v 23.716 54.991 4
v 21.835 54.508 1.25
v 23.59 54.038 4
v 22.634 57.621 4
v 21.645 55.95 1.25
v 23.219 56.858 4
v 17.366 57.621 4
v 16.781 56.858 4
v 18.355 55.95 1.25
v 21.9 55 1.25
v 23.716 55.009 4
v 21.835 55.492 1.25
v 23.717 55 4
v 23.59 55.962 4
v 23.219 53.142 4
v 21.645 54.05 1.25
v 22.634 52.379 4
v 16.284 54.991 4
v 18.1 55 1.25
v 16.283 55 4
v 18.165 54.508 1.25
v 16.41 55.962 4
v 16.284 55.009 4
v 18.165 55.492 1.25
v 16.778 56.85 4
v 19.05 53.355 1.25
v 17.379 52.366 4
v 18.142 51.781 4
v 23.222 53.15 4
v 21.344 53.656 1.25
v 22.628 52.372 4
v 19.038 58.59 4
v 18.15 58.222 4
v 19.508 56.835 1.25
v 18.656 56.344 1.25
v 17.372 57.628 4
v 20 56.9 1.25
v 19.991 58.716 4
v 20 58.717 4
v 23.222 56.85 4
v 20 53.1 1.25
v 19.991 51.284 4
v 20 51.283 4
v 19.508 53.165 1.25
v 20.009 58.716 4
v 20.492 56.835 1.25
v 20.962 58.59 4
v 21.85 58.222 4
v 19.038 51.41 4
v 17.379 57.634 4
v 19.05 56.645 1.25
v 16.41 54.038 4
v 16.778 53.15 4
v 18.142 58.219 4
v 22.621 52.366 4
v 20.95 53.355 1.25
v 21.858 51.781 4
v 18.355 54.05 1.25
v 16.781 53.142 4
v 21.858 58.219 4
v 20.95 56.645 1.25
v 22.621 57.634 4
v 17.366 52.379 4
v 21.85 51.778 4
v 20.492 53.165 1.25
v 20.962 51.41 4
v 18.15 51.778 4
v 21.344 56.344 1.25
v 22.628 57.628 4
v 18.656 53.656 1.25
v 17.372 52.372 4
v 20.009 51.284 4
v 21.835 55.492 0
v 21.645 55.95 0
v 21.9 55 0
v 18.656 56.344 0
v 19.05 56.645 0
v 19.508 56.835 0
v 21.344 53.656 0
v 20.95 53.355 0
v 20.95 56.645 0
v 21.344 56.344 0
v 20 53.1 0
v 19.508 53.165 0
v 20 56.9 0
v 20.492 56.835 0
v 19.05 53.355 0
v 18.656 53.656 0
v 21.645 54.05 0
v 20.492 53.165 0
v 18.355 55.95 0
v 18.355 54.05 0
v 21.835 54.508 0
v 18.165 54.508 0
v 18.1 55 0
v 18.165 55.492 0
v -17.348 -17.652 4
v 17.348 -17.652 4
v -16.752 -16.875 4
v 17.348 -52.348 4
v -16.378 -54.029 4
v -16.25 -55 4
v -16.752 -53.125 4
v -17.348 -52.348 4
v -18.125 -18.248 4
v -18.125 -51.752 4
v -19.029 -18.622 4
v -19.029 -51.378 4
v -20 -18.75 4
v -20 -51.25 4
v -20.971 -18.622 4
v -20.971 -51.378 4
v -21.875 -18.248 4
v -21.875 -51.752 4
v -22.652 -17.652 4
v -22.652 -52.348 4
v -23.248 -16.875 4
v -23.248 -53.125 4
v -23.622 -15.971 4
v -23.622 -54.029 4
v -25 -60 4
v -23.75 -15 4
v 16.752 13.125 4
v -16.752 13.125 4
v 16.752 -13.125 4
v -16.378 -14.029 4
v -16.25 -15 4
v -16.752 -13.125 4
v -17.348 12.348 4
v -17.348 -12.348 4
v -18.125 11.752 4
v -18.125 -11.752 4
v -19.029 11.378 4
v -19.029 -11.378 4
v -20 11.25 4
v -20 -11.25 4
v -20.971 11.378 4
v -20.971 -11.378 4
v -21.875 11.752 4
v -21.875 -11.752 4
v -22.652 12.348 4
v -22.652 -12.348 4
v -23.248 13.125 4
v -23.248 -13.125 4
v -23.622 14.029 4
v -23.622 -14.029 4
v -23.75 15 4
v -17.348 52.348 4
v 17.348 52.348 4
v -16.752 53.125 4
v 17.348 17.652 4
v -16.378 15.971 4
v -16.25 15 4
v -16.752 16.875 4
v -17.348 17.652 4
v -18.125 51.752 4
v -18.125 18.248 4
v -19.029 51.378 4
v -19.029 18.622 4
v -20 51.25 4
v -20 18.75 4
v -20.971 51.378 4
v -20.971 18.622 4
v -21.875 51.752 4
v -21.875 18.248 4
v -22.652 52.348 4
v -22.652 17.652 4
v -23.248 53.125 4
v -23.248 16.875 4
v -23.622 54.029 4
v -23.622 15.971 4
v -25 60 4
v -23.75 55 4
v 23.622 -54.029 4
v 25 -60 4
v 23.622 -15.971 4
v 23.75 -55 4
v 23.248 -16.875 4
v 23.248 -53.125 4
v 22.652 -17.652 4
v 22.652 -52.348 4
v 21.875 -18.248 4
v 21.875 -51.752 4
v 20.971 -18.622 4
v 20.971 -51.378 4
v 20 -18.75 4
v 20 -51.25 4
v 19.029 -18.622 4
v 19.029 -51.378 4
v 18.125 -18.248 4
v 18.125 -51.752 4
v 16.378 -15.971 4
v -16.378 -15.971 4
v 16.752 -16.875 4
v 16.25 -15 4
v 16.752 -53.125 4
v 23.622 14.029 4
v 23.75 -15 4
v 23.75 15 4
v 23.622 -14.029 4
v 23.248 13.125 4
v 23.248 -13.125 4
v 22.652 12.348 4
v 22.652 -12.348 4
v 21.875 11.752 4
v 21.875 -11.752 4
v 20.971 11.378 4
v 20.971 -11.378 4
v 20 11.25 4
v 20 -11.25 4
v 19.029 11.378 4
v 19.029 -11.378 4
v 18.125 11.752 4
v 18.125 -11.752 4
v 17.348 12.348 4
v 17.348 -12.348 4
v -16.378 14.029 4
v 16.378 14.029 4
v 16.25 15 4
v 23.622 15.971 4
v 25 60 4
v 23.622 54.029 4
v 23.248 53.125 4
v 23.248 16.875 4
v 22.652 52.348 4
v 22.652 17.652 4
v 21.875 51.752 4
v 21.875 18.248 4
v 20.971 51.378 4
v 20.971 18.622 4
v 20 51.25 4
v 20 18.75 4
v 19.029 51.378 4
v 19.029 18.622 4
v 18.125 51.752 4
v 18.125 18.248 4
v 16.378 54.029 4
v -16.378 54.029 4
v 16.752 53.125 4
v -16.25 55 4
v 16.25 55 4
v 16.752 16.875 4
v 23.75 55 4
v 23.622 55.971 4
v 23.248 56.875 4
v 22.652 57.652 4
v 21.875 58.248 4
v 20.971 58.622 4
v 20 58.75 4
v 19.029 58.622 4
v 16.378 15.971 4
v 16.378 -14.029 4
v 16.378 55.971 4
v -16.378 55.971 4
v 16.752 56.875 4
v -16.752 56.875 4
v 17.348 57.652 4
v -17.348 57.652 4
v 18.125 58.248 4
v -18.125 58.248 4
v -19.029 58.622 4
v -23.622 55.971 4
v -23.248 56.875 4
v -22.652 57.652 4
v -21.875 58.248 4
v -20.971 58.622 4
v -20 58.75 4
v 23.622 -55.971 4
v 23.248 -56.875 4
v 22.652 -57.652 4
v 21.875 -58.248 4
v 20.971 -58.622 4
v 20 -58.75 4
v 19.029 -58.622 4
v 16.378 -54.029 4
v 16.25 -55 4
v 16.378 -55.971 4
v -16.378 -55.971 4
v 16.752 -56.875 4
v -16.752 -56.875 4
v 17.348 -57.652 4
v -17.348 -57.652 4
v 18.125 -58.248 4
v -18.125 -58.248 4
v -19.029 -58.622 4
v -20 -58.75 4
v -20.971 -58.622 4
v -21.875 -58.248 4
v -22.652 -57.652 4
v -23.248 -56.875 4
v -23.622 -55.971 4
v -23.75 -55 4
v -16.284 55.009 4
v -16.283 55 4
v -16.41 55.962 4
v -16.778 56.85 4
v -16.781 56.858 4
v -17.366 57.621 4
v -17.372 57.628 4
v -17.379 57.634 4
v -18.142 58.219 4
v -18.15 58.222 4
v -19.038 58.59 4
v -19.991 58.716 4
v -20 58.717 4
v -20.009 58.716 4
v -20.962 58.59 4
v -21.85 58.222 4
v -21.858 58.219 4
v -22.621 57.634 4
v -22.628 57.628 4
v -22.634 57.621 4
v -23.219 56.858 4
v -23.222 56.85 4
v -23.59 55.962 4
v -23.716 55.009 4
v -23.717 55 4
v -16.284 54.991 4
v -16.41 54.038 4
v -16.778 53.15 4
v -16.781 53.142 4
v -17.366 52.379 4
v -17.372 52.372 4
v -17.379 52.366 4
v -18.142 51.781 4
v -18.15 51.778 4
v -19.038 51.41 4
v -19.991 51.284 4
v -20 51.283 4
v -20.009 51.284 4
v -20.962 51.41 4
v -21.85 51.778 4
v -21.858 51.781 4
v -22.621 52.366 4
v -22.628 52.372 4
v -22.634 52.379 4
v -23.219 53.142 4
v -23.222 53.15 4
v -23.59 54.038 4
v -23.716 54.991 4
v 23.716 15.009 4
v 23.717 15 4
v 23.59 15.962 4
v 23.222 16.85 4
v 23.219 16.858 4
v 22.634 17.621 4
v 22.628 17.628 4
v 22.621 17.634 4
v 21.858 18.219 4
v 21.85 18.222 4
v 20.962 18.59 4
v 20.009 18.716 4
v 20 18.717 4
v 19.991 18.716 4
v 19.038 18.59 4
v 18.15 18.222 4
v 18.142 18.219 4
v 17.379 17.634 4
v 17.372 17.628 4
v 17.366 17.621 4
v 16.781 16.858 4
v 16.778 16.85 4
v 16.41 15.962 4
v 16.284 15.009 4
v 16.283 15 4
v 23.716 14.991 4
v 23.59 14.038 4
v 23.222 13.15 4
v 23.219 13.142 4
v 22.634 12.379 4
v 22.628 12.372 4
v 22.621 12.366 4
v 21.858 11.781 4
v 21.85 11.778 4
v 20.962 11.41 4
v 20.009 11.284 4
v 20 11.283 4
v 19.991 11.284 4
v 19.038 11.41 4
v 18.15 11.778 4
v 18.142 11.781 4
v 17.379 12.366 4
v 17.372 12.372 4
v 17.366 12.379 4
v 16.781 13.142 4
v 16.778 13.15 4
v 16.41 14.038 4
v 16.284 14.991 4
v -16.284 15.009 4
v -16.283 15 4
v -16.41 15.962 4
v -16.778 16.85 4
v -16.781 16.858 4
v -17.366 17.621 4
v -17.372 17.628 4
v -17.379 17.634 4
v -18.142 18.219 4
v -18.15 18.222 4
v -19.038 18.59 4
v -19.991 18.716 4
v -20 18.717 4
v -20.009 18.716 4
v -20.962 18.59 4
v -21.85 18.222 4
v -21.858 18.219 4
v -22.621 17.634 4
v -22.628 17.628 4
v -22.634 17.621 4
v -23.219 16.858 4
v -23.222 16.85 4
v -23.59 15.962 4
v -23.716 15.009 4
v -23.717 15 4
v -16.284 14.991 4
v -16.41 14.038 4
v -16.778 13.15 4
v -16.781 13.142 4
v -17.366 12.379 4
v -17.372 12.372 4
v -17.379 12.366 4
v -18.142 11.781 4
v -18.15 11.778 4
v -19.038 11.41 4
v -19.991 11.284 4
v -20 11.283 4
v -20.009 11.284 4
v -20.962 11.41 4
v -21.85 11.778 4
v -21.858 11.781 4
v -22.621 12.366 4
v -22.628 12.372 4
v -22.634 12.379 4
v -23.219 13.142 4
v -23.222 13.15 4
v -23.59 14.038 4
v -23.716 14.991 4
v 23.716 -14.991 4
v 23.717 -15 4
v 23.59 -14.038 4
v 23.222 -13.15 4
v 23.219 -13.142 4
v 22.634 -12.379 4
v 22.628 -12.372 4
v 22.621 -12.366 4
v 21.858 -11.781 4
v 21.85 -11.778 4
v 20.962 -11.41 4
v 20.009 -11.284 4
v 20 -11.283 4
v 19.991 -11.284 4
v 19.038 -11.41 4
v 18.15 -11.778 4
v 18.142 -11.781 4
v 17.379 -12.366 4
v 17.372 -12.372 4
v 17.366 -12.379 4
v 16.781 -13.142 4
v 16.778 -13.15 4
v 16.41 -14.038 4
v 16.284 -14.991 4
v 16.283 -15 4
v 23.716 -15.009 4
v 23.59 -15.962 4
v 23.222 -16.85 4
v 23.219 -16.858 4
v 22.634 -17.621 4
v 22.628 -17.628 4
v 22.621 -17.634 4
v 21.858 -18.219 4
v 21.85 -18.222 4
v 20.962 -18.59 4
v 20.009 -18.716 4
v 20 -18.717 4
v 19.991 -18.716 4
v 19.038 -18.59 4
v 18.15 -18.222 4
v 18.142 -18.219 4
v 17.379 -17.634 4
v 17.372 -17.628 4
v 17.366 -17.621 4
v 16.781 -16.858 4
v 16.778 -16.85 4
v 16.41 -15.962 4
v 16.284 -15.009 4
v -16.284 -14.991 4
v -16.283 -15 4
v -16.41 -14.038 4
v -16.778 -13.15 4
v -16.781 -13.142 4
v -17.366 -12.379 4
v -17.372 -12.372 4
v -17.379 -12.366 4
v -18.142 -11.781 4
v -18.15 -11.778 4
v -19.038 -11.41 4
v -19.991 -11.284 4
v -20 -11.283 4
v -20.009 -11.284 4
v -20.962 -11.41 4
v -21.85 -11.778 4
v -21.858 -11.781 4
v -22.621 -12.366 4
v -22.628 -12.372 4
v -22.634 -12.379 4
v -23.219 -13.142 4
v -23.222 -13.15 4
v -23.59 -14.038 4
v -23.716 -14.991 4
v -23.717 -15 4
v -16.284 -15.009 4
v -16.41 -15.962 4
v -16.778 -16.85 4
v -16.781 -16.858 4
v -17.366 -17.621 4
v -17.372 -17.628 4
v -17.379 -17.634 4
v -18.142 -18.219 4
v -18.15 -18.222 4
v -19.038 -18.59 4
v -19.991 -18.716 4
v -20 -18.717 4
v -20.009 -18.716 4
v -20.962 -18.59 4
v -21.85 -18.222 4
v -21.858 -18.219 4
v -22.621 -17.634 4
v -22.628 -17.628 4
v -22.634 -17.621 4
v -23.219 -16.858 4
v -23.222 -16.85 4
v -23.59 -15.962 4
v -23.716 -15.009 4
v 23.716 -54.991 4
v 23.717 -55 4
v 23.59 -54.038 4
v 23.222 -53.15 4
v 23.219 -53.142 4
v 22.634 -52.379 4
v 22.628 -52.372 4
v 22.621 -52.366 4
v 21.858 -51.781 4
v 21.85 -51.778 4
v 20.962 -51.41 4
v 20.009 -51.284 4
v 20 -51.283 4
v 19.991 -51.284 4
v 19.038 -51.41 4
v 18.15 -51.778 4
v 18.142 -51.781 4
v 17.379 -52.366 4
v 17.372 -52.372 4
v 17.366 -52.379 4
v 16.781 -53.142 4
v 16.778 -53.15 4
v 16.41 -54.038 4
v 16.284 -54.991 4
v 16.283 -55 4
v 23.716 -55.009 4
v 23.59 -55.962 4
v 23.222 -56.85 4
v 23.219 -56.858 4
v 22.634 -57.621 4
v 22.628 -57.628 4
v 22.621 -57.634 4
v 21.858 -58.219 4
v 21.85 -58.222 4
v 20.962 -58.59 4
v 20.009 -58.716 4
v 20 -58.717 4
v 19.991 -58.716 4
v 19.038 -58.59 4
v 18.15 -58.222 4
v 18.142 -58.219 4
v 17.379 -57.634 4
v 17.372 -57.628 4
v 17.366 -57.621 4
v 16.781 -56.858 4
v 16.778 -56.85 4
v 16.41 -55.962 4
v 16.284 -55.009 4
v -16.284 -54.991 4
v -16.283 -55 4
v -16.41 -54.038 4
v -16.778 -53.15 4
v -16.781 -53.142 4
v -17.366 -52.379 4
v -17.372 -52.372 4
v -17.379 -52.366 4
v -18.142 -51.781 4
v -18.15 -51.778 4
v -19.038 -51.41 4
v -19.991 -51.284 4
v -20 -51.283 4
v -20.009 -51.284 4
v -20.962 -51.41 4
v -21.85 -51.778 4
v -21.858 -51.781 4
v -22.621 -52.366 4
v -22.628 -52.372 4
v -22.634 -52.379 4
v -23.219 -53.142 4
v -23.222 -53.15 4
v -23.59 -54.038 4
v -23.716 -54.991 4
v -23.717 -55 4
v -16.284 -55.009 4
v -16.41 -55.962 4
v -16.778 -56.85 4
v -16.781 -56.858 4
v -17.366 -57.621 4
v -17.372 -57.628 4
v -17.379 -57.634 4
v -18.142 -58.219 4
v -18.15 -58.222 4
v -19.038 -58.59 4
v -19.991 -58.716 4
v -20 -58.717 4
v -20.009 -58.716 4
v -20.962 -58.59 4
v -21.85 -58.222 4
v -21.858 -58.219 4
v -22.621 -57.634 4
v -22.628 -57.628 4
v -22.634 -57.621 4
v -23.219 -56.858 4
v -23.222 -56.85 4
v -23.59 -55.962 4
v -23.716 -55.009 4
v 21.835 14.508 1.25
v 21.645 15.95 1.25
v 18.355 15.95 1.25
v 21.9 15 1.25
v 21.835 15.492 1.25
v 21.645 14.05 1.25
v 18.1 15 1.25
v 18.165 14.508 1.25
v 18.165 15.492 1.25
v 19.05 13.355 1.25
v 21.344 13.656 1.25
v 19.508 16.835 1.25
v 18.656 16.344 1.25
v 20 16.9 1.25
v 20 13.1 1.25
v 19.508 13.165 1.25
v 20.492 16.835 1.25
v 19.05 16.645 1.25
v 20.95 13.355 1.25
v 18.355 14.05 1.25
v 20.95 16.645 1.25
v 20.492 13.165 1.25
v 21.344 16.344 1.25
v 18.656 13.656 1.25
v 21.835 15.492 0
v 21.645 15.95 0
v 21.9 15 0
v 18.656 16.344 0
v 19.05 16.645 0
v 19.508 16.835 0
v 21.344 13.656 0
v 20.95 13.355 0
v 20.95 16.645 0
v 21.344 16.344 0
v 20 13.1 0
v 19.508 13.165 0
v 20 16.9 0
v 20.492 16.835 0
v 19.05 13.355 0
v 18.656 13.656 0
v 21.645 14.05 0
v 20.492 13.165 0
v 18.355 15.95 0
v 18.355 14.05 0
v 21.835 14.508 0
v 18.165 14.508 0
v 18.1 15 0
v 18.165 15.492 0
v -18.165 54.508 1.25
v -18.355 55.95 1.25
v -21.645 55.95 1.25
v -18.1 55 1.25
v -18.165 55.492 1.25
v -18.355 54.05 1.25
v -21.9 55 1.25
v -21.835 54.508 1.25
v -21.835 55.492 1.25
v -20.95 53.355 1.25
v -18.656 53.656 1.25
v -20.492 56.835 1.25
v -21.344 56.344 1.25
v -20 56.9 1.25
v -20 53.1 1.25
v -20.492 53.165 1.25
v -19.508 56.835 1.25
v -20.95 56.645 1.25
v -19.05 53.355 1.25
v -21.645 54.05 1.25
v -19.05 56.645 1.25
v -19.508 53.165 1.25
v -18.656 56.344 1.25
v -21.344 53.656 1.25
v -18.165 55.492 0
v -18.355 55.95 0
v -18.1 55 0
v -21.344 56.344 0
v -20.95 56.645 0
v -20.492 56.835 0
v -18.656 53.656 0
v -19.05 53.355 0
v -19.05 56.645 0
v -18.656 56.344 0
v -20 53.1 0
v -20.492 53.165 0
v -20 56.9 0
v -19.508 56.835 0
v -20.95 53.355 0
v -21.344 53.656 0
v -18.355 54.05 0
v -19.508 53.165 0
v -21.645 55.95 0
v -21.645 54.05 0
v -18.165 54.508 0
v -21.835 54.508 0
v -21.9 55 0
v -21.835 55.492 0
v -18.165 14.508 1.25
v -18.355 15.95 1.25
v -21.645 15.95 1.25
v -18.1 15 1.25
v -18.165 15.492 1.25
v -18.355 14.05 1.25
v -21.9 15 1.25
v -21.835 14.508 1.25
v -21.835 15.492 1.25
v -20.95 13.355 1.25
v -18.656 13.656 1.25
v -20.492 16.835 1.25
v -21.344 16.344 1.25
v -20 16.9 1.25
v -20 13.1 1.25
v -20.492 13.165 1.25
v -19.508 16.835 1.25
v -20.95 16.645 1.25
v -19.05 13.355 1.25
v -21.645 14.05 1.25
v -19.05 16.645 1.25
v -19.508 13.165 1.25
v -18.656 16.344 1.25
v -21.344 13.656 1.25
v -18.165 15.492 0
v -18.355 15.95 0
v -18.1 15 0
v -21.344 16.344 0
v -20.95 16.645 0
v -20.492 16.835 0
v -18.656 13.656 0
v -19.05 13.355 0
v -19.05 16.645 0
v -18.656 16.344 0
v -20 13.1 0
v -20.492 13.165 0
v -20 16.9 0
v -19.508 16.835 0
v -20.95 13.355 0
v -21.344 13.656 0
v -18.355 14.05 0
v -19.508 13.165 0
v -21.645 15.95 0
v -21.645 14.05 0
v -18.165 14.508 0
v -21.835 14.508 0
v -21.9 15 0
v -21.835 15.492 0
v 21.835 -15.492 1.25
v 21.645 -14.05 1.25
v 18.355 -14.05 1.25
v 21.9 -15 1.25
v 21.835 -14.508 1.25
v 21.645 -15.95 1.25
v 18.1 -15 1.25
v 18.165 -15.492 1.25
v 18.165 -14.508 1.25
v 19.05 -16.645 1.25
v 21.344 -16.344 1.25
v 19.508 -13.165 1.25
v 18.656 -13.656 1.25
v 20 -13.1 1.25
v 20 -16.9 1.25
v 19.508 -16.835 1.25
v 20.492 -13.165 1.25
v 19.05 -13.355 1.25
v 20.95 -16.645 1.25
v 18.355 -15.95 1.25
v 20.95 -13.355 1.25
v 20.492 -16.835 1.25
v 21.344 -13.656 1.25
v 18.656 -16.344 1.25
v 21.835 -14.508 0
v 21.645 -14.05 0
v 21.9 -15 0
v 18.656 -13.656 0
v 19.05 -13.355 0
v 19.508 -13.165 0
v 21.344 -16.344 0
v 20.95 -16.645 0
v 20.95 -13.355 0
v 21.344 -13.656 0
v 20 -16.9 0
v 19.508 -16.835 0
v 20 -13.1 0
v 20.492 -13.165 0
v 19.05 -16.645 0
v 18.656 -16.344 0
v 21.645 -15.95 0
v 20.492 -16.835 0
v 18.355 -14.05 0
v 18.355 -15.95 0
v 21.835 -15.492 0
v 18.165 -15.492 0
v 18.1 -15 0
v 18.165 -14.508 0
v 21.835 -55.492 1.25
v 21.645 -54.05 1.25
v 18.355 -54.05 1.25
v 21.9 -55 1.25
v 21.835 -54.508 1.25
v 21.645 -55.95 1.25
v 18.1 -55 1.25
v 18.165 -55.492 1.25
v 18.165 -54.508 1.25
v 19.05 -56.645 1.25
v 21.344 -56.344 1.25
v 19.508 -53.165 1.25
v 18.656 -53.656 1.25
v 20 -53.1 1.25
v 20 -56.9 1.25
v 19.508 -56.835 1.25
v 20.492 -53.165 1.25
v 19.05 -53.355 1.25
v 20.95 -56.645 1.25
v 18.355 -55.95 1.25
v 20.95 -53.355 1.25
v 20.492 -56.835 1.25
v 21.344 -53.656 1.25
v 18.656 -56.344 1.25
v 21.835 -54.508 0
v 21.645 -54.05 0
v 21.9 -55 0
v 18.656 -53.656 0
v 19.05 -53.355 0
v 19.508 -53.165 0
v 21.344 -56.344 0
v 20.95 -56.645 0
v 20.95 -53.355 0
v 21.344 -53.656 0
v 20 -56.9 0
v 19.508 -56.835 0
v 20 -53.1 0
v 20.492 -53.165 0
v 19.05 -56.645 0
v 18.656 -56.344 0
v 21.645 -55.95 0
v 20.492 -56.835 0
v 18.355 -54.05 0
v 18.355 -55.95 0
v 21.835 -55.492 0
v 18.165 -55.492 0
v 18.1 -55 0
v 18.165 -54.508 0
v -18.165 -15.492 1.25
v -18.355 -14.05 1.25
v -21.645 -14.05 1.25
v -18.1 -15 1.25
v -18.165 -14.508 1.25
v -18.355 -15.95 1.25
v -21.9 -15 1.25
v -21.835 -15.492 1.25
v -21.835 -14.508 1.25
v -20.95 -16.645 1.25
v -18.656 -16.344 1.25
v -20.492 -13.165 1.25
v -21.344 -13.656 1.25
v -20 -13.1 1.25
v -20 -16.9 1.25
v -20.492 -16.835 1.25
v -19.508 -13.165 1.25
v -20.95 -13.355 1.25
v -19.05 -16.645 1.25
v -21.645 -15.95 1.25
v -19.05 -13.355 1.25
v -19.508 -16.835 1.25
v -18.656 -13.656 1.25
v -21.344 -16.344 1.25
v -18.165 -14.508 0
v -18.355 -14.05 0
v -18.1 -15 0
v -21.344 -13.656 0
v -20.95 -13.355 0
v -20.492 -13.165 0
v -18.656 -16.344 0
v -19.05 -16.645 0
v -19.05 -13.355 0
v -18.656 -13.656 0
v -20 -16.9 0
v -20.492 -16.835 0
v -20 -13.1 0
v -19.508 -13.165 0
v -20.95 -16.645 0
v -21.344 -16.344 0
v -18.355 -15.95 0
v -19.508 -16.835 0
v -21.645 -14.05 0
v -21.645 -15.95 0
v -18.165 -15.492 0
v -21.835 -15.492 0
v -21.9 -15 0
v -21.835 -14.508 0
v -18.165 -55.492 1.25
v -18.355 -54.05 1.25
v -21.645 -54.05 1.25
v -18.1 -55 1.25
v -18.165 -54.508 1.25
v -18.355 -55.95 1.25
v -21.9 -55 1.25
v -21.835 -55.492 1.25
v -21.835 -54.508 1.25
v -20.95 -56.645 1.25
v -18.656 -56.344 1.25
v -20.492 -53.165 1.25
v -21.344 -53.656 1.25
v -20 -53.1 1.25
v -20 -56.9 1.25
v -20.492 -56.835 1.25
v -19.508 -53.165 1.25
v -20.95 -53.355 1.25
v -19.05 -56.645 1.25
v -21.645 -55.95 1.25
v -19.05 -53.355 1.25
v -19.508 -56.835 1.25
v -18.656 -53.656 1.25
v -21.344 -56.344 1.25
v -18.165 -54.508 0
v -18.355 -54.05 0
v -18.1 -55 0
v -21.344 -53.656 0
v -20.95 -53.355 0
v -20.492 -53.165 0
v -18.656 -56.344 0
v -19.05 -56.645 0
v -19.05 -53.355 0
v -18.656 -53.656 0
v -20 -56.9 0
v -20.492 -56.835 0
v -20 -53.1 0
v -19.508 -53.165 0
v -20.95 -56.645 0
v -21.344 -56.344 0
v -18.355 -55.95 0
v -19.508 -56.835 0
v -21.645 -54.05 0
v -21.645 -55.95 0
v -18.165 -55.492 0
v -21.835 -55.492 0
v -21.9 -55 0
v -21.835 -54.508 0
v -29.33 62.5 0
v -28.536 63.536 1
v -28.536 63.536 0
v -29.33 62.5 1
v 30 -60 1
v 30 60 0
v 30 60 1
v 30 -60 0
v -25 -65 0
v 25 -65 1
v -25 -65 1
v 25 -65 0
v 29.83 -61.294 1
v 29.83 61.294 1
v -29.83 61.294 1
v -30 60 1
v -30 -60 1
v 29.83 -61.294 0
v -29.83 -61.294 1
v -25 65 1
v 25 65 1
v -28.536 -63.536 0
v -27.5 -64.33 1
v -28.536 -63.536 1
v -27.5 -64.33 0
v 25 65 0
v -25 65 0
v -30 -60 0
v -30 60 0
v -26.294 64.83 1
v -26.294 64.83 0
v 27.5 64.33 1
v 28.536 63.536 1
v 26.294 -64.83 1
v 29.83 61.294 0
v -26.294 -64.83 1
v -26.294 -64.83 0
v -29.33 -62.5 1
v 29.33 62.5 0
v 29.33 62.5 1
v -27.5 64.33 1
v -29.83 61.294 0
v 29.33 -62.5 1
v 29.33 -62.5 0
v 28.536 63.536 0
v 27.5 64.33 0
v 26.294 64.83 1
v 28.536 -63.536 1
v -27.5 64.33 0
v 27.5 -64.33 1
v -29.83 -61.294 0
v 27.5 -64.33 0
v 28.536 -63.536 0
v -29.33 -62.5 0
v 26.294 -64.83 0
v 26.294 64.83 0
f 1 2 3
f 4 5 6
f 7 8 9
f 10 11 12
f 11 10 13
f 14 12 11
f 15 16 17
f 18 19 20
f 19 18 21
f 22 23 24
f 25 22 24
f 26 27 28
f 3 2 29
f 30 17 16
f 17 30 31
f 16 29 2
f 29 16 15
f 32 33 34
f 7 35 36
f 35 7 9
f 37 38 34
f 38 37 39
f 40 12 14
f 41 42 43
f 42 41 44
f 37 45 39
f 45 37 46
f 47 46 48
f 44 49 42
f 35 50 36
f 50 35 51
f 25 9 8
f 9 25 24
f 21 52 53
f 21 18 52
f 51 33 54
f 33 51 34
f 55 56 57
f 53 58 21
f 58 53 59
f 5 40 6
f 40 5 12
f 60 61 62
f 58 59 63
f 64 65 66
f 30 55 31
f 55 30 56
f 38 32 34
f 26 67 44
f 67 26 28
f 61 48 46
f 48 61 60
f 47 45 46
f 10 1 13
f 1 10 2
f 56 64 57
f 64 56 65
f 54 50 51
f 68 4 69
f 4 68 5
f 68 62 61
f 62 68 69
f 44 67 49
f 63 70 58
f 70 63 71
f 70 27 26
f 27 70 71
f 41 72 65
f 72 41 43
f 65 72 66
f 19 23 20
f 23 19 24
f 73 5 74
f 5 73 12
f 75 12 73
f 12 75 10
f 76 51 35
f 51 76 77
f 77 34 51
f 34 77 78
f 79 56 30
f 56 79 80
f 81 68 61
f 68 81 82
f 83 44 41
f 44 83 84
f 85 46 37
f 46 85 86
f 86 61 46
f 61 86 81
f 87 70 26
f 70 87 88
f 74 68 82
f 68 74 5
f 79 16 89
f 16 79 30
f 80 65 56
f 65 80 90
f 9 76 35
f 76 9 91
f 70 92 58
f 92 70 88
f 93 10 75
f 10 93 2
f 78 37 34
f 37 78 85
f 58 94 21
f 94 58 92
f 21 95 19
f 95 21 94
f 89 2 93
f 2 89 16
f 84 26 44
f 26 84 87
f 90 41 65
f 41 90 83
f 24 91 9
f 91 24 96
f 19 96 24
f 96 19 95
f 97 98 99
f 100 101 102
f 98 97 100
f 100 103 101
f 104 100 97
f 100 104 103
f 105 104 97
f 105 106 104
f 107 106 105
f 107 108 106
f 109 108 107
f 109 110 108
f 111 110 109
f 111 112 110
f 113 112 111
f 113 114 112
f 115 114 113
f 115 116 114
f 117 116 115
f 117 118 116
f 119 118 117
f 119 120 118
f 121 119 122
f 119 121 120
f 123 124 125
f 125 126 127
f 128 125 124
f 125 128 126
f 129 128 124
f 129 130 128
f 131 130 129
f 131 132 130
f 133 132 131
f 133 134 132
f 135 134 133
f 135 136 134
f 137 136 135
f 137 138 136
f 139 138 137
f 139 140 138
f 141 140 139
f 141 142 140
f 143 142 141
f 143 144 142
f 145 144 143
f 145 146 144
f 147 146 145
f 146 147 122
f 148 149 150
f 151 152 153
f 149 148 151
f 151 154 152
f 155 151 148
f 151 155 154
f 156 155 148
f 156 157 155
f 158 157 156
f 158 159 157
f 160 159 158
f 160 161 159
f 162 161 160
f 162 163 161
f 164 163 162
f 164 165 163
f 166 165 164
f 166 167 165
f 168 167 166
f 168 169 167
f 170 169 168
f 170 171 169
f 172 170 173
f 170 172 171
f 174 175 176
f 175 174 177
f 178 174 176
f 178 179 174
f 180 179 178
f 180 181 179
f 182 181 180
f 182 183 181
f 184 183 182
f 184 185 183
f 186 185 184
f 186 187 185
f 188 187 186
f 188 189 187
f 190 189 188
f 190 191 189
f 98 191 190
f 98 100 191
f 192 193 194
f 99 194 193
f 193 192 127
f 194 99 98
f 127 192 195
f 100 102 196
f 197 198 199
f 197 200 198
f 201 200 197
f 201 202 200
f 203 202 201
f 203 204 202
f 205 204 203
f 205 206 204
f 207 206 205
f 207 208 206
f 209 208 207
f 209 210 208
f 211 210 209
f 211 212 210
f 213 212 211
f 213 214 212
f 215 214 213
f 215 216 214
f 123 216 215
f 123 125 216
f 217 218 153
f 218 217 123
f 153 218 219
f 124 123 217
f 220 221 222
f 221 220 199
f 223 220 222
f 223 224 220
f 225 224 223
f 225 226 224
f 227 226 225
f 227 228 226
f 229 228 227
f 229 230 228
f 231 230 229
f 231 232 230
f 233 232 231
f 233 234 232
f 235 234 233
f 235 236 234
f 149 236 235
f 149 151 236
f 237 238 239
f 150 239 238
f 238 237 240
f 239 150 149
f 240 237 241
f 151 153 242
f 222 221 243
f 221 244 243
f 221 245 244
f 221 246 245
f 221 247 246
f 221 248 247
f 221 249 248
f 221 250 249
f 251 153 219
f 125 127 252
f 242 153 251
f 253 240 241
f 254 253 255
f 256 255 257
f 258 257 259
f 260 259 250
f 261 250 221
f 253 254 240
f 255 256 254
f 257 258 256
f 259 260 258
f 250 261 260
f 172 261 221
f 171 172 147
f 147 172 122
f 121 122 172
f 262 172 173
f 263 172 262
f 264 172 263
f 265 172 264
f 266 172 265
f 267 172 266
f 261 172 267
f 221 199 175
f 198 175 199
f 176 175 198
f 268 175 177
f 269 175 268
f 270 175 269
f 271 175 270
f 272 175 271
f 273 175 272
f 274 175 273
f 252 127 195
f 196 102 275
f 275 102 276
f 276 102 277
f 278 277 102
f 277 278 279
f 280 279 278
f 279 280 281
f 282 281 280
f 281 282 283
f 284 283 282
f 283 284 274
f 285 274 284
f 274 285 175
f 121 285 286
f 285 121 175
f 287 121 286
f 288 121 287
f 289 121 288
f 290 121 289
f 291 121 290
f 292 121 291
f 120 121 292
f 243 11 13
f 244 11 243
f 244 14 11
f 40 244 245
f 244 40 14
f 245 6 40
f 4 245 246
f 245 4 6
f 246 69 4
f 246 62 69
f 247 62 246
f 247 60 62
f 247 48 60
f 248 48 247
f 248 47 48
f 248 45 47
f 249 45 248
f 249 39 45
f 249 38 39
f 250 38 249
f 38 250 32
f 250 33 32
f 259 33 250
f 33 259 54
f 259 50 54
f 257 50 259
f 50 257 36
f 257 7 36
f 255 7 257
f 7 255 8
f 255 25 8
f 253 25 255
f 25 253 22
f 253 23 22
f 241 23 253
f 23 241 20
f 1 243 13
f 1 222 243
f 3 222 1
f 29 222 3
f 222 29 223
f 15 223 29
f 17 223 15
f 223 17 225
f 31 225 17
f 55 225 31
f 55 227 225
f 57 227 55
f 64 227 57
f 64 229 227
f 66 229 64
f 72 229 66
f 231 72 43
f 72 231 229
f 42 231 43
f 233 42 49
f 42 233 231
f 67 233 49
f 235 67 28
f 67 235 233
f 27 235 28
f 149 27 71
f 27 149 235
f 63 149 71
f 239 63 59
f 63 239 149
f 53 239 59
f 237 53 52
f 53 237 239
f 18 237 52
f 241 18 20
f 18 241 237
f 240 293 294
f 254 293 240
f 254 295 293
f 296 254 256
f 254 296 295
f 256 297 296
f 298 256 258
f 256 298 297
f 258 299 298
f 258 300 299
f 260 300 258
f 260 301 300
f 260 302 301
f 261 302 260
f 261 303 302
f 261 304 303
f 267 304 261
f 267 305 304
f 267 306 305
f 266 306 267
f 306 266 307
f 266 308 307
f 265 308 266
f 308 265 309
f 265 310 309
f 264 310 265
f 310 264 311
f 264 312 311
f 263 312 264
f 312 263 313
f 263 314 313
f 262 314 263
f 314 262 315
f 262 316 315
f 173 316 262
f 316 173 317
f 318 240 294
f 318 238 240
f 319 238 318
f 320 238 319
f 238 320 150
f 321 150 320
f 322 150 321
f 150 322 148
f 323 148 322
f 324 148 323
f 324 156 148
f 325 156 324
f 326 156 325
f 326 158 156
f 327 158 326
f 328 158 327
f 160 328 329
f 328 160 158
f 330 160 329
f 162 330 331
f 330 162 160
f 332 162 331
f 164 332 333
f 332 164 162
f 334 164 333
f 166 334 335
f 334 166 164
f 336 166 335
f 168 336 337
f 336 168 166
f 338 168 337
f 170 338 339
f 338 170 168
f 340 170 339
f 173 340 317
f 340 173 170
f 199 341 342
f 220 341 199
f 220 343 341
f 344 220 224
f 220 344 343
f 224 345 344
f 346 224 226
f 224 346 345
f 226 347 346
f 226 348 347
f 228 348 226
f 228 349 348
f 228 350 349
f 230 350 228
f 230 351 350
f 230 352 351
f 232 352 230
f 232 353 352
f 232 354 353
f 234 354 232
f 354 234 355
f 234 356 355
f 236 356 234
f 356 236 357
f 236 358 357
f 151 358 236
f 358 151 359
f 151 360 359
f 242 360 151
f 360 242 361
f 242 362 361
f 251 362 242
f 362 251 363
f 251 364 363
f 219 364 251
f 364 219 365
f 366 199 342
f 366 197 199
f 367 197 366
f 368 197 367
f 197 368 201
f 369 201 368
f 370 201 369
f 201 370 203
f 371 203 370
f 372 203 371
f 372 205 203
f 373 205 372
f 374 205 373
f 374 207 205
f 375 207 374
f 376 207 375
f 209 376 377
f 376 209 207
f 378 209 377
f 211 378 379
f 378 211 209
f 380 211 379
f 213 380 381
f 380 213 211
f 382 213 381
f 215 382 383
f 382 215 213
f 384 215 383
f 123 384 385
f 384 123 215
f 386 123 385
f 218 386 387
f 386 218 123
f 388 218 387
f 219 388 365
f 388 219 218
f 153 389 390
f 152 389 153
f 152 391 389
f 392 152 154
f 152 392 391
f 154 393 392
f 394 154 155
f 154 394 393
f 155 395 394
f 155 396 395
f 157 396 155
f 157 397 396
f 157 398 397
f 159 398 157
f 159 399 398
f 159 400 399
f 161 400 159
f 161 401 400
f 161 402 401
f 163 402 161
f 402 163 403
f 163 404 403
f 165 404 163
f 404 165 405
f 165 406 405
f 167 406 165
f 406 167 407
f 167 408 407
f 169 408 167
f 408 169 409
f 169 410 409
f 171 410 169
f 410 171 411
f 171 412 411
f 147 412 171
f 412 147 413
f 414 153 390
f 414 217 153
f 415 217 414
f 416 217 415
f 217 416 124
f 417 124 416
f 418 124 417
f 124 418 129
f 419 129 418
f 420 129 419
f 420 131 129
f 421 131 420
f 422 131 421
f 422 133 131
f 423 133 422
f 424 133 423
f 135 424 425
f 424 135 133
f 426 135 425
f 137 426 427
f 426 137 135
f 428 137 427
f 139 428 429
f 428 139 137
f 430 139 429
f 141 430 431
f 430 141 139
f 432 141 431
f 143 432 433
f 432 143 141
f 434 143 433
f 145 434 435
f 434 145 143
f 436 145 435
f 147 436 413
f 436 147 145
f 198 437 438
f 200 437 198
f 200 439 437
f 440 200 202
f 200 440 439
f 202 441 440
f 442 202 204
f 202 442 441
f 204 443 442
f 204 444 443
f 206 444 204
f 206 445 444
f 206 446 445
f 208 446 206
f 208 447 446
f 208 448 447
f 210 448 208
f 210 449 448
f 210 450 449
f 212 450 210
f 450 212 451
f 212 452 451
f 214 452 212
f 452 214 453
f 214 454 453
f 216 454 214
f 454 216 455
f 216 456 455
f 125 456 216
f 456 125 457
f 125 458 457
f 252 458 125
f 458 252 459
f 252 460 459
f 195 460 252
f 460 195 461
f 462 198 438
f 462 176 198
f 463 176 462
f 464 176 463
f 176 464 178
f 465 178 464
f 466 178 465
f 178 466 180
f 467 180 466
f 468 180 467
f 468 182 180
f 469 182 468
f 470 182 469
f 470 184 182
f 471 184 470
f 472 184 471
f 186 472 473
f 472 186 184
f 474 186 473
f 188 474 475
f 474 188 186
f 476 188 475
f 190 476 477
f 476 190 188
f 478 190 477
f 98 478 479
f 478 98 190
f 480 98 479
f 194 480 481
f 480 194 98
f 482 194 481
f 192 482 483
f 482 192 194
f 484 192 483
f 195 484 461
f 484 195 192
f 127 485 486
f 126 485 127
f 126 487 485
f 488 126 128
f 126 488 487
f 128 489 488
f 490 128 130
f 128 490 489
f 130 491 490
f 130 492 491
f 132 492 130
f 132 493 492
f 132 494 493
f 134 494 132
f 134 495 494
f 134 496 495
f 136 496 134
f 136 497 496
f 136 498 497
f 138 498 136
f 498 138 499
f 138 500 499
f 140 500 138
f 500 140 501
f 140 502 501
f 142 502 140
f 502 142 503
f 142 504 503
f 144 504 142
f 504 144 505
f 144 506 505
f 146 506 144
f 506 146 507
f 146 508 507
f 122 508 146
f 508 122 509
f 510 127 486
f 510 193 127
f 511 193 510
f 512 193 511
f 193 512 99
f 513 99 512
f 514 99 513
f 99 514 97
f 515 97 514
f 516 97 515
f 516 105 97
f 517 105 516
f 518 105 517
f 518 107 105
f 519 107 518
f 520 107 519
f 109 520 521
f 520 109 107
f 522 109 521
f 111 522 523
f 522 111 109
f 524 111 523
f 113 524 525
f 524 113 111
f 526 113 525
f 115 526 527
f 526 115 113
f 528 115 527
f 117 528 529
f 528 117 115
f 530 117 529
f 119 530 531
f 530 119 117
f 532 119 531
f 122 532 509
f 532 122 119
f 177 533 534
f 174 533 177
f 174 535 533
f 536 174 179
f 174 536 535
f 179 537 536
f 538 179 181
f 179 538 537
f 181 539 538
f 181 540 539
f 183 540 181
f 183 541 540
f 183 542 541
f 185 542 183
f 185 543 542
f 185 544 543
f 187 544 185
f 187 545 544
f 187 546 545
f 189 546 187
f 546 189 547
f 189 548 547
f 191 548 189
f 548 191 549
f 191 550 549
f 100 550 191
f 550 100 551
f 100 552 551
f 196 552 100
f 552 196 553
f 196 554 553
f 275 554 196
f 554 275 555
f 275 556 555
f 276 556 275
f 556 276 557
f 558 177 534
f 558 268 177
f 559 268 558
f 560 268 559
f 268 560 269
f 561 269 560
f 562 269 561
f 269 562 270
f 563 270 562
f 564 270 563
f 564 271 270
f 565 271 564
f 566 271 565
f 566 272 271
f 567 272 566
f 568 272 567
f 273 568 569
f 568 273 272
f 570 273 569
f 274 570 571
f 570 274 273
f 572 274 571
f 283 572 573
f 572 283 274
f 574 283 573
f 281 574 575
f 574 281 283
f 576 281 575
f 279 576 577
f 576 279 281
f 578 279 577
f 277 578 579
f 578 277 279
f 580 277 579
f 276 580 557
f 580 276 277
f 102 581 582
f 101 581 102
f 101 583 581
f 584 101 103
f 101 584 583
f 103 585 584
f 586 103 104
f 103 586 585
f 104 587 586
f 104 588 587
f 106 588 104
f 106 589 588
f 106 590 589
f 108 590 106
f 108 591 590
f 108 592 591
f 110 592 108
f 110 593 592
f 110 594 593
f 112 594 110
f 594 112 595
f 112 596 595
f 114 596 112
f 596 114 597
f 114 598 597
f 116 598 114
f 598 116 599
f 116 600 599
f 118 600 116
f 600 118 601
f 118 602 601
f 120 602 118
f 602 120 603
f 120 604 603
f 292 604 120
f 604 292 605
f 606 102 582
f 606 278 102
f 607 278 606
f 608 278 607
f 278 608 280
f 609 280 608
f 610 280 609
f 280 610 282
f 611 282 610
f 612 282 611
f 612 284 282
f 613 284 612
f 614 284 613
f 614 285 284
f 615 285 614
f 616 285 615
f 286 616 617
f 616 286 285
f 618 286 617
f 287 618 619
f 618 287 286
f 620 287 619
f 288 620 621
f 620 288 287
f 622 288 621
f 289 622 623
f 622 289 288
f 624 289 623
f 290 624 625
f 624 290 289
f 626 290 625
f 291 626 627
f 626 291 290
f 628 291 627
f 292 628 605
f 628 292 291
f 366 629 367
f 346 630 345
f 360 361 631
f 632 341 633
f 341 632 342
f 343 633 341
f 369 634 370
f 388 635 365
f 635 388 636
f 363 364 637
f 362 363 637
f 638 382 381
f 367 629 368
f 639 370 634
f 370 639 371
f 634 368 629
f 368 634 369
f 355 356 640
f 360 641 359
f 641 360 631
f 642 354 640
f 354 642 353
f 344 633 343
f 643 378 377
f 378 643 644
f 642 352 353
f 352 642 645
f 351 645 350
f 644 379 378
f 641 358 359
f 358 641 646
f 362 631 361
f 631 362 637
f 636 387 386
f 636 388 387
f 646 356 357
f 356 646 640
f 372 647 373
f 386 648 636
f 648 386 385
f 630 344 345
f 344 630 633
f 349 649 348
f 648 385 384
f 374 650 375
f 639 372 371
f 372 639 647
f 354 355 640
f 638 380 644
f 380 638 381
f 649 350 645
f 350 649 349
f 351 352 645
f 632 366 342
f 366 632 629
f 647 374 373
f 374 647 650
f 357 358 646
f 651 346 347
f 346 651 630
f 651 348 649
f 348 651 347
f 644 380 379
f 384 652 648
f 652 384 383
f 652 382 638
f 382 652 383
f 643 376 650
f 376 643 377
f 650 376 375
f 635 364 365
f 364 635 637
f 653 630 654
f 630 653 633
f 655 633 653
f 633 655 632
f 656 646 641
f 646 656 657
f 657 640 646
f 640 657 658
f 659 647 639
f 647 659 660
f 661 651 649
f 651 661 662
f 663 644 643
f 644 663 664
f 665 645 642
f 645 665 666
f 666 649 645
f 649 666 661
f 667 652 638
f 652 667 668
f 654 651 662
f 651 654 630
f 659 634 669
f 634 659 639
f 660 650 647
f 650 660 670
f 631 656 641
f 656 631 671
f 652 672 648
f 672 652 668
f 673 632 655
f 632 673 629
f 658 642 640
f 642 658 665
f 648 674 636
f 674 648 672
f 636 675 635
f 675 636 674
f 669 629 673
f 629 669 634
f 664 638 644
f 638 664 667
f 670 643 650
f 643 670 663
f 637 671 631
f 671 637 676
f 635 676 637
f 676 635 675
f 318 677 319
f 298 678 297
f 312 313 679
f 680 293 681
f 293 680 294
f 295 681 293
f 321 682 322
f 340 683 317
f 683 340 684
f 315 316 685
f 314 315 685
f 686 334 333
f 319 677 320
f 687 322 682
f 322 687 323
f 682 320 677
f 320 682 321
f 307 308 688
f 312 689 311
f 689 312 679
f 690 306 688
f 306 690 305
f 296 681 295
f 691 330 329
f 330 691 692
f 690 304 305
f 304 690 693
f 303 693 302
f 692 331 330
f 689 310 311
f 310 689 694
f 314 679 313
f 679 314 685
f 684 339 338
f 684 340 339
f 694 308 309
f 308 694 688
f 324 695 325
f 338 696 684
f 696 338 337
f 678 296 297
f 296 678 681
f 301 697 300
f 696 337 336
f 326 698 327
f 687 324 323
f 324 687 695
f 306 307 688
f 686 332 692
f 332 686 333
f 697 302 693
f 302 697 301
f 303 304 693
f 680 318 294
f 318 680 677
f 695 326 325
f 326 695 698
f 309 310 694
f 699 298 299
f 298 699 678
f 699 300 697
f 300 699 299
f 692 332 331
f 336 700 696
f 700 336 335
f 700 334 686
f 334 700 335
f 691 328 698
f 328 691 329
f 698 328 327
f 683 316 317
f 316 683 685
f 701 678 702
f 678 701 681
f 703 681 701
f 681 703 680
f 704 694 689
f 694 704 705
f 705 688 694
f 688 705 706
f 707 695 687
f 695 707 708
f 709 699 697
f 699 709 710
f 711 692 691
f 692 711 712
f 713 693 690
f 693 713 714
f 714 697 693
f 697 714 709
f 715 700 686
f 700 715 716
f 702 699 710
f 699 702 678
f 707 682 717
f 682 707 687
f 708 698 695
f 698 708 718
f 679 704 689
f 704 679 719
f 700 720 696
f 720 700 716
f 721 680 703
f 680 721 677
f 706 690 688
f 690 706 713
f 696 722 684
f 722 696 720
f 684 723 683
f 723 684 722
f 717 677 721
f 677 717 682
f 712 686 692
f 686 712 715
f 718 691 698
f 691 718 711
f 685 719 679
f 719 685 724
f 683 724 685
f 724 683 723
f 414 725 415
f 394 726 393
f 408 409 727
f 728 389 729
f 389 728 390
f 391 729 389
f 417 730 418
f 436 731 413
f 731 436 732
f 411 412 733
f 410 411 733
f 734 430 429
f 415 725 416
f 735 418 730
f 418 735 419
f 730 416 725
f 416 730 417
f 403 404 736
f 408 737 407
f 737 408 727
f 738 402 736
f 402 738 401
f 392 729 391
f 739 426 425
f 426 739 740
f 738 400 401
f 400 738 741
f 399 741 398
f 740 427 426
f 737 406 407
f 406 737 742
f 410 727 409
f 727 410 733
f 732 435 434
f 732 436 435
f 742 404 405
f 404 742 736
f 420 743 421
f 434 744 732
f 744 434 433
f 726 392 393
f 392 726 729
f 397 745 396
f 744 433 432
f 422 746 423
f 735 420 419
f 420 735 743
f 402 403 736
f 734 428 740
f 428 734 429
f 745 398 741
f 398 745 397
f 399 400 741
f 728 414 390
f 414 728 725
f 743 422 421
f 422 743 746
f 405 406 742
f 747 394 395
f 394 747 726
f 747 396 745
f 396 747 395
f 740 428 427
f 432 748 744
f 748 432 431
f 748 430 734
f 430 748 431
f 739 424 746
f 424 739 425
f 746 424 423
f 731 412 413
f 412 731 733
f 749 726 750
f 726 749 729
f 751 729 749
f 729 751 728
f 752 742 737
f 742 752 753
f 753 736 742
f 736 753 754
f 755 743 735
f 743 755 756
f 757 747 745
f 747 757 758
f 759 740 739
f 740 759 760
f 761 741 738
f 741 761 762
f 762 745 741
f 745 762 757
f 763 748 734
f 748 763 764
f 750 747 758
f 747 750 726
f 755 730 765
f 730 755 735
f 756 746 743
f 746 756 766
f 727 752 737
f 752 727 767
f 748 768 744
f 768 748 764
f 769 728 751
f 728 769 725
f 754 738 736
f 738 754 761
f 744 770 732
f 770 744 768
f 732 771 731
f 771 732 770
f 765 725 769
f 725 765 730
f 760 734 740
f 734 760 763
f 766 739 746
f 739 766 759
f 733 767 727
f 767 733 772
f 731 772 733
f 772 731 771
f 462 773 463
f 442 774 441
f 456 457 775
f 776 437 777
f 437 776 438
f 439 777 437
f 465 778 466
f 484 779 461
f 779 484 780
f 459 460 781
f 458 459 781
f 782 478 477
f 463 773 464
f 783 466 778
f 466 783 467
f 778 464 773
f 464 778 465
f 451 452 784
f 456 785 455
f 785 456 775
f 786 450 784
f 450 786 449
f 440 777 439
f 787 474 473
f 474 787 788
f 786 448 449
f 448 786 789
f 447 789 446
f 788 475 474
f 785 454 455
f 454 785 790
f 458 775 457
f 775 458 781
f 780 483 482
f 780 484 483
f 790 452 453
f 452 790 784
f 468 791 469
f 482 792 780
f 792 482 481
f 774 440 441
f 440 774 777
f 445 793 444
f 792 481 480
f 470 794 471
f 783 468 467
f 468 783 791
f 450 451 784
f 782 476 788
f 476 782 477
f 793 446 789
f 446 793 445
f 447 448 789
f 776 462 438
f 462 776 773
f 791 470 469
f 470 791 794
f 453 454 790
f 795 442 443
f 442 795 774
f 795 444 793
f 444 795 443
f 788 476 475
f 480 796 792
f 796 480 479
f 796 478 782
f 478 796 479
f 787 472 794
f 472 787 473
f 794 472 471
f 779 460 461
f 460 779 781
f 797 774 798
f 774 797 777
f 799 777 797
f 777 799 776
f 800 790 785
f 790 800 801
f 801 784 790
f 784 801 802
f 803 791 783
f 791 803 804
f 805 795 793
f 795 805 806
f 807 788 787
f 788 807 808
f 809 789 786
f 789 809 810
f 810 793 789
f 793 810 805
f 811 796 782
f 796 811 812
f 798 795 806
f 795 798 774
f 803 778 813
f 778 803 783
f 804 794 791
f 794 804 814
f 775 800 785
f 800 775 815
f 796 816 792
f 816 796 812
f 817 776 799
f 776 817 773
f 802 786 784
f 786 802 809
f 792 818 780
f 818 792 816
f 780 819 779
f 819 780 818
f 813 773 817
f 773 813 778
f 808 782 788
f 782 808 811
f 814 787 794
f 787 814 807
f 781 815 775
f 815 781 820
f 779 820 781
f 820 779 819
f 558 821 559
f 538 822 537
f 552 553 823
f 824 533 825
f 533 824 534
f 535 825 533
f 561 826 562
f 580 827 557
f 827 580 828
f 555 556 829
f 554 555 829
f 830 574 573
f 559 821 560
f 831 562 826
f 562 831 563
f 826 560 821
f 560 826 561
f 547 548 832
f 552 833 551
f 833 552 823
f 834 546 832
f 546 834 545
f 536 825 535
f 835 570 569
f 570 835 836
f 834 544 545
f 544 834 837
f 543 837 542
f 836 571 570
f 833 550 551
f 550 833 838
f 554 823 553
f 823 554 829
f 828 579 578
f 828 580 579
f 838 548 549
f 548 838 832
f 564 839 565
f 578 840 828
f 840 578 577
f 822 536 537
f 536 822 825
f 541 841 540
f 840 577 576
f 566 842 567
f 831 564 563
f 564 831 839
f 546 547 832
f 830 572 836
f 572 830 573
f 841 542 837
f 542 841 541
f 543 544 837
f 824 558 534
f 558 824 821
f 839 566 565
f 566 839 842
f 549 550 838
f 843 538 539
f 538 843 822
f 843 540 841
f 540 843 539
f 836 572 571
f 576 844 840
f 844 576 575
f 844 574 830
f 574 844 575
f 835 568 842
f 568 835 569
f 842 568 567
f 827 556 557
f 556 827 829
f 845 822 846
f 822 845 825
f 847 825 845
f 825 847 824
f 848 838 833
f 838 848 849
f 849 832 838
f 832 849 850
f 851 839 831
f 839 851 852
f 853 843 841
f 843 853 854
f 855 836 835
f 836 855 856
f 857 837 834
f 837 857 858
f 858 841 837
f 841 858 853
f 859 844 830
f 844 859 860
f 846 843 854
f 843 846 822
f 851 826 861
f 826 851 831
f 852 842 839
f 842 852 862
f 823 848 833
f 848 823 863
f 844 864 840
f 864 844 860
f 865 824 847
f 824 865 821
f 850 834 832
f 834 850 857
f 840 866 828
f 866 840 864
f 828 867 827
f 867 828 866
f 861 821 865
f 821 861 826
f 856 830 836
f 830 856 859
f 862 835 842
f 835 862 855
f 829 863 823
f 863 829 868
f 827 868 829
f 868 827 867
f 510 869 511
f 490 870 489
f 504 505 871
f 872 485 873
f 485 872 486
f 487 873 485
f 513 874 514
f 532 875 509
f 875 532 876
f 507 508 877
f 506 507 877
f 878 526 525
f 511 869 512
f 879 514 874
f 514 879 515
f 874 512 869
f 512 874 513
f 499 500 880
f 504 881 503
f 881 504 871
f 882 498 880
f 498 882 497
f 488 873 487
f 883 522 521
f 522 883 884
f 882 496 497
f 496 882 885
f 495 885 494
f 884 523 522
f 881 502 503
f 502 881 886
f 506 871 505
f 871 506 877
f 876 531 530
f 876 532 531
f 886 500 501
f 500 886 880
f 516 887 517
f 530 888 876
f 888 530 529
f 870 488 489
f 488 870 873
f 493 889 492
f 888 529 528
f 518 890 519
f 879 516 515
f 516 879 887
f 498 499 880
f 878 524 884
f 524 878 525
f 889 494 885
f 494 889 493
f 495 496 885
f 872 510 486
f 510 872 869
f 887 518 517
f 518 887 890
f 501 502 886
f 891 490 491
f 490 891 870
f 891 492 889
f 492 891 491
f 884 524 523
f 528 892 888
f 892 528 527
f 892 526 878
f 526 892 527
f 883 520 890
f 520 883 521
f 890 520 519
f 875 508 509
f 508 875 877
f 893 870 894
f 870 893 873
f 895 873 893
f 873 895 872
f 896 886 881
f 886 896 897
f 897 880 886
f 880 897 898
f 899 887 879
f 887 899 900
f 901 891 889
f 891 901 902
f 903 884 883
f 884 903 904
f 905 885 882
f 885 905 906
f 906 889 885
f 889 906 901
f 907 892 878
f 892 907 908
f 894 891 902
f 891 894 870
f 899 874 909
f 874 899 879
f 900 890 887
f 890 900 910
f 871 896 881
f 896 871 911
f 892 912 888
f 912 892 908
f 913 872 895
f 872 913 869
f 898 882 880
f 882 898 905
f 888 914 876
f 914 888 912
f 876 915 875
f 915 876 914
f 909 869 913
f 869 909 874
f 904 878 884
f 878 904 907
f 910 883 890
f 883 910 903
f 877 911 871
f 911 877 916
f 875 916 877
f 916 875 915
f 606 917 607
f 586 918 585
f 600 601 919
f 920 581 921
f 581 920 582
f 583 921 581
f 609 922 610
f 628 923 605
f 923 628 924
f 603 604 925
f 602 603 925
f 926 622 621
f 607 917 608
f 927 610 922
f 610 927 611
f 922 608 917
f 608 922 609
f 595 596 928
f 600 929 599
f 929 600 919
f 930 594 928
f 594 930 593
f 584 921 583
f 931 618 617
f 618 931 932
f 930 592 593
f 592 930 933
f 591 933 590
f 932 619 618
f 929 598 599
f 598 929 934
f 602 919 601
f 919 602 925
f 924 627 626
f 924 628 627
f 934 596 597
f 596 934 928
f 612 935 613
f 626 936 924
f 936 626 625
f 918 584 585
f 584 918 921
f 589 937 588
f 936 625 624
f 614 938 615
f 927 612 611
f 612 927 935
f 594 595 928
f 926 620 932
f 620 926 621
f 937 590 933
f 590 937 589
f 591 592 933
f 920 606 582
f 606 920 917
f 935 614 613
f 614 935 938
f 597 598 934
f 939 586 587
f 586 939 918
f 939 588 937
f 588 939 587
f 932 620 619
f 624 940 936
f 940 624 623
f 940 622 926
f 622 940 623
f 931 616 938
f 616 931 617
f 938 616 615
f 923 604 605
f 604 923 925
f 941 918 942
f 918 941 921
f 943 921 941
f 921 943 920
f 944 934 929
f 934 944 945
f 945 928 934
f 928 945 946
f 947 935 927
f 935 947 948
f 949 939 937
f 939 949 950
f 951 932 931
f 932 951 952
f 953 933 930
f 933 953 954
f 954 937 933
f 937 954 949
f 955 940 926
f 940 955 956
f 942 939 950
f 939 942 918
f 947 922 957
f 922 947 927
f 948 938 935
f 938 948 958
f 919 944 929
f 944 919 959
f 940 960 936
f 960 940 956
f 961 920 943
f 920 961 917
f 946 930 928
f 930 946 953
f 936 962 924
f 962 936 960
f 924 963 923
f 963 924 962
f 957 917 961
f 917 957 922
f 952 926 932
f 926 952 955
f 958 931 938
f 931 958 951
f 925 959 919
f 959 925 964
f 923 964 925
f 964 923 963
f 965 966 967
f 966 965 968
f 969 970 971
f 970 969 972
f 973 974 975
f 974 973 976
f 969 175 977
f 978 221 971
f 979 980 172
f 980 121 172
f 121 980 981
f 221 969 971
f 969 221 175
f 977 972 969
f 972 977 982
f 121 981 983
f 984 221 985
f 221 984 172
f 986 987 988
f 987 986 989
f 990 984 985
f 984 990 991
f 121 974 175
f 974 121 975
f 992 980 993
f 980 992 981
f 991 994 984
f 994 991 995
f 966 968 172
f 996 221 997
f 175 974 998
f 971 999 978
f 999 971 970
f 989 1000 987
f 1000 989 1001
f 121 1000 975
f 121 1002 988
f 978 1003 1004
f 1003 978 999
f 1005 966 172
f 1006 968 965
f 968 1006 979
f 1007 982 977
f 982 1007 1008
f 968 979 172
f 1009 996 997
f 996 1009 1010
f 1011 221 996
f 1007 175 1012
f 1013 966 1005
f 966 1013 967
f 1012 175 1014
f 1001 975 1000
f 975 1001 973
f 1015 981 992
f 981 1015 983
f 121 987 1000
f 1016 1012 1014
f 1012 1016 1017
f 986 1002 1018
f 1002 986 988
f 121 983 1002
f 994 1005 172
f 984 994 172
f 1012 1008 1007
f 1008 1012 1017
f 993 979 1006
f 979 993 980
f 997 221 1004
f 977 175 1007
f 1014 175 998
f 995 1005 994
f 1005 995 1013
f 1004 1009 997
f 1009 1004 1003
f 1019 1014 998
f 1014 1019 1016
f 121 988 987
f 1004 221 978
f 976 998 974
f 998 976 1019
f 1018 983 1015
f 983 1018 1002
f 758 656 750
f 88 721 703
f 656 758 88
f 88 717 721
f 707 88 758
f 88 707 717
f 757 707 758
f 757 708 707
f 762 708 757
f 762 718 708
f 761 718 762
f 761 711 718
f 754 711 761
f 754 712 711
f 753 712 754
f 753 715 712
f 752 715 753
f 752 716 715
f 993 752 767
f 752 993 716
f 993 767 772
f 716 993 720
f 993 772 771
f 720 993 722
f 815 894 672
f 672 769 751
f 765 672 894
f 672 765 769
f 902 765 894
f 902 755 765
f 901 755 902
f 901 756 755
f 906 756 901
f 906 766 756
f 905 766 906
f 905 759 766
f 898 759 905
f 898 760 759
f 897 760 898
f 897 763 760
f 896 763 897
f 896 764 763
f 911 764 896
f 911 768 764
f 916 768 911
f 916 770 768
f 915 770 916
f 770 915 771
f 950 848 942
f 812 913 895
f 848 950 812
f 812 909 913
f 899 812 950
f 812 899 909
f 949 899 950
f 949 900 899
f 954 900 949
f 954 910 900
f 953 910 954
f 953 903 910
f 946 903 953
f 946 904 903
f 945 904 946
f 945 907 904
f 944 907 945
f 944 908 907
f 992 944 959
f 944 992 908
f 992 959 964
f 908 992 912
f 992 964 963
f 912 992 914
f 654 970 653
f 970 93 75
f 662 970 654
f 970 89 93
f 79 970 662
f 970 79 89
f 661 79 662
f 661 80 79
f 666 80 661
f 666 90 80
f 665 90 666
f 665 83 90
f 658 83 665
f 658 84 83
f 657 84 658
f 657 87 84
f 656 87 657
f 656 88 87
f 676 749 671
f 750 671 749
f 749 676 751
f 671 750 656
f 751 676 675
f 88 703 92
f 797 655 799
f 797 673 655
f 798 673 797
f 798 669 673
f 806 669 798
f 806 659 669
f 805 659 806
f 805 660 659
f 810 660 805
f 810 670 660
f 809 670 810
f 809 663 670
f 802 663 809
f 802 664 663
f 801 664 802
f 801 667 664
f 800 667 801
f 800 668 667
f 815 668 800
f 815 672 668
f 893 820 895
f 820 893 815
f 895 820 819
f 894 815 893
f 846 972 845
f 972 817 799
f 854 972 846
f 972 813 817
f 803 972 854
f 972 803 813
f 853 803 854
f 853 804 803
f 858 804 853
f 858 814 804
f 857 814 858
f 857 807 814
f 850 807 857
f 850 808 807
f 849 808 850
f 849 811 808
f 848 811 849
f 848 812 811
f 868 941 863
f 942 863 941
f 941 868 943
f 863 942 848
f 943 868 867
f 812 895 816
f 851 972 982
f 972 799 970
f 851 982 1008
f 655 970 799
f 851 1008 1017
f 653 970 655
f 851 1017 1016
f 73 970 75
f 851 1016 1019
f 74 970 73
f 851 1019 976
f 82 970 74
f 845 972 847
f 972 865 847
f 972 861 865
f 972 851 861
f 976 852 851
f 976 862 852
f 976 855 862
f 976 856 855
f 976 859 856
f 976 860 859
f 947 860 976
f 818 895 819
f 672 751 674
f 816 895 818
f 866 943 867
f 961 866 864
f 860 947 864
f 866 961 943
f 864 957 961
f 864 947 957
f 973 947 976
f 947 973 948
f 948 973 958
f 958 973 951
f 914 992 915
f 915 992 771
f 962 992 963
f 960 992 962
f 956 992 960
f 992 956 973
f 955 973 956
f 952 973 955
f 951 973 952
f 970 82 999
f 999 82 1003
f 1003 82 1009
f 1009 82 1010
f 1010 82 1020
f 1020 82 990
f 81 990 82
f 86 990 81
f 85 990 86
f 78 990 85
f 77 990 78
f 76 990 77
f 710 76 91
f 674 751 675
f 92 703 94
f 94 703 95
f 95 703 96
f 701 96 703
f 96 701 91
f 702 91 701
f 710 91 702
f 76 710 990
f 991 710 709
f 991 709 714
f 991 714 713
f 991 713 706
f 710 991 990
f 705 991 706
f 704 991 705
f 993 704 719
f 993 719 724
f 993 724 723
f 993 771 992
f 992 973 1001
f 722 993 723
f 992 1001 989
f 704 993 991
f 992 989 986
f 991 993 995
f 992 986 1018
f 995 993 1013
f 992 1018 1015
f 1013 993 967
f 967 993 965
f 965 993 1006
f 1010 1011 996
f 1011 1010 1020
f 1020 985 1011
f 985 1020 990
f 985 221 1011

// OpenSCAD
// file: ../../lib/util.scad
function _assert_vec2(vec) =
    assert(is_list(vec) && len(vec) == 2, "a vec is not a list of 2 elements")
    assert(is_num(vec.x) && is_num(vec.y), "a vec component is not a number")
    true;


function _assert_vec3(vec) =
    assert(is_list(vec) && len(vec) == 3, "a vec is not a list of 3 elements")
    assert(is_num(vec.x) && is_num(vec.y) && is_num(vec.z), "a vec component is not a number")
    true;


function _assert_flat(flat) =
    assert(is_list(flat) && len(flat) > 2, "a flat is not a list of more than 2 points")
    is_list([ for (point = flat)
        assert(is_list(point) && len(point) == 2, "a point in a flat is not a list of 2 elements")
        assert(is_num(point.x) && is_num(point.y), "a component of a point in a flat is not a number")
        true
    ]);


function _assert_slice(slice) =
    assert(is_list(slice) && len(slice) > 2, "a slice is not a list of more than 2 points")
    is_list([ for (point = slice)
        assert(is_list(point) && len(point) == 3, "a point in a slice is not a list of 3 elements")
        assert(is_num(point.x) && is_num(point.y) && is_num(point.z), "a component of a point in a slice is not a number")
        true
    ]);


module _halfplane(axis, dir, INF) {
    assert(is_string(axis) && len(axis) == 1 && len(search(axis, "xy")) == 1);
    assert(is_string(dir) && len(dir) == 1 && len(search(dir, "+-")) == 1);

    module hp0() {
        translate([INF / 2, 0])
            square(INF, center = true);
    }

    module hp1() {
        if (dir == "+") {
            hp0();
        } else {
            rotate(180)
                hp0();
        }
    }

    if (axis == "x") {
        hp1();
    } else {
        rotate(90)
            hp1();
    }
}


module half2(which = "x+", INF = 10 ^ 3) {
    intersection() {
        _halfplane(which[0], which[1], INF);

        children();
    }
}


module _halfspace(axis, dir, INF) {
    assert(is_string(axis) && len(axis) == 1 && len(search(axis, "xyz")) == 1);
    assert(is_string(dir) && len(dir) == 1 && len(search(dir, "+-")) == 1);

    module hp0() {
        translate([0, 0, INF / 2])
            cube(INF, center = true);
    }

    module hp1() {
        if (dir == "+") {
            hp0();
        } else {
            mirror([0, 0, 1])
                hp0();
        }
    }

    if (axis == "z") {
        hp1();
    } else if (axis == "y") {
        rotate([-90, 0, 0])
            hp1();
    } else {
        rotate([0, 90, 0])
            hp1();
    }
}


module half3(which = "z+", INF = 10 ^ 3) {
    intersection() {
        _halfspace(which[0], which[1], INF);

        children();
    }
}
// main file
use <../../lib/util.scad>

leg_width = 70;
leg_margin = 5;

joiner_rounding = 5;
joiner_thickness = 4;

screw_r = 1.9;
screw_h = 19.2;
screw_cap_r = 3.75;
screw_cap_h = 2.8;

module screw(hole = false) {
    $fn = 24;

    translate(hole ? [0, 0, 0.05] : [0, 0, 0])
    mirror([0, 0, 1]) {
        cylinder(h = screw_cap_h, r1 = screw_cap_r, r2 = screw_r);
        cylinder(h = screw_h, r = screw_r);
    }

    if (hole) {
        cylinder(h = 1, r = screw_cap_r);
    }
}

module joiner() {
    x = leg_width - leg_margin * 2 - joiner_rounding * 2;
    y = leg_width * 2 - leg_margin * 2 - joiner_rounding * 2;

    module rounder() {
        $fn = 24;

        rotate_extrude()
        polygon([
            [0, 0],
            [joiner_rounding, 0],
            [0, joiner_thickness - 1],
        ]);
    }

    module plate() {
        minkowski() {
            linear_extrude(1)
            square([x, y], center = true);

            rounder();
        }
    }

    module screw_hole() {
        translate([0, 0, joiner_thickness])
        screw(hole = true);
    }

    module screw_hole_group() {
        o = leg_width / 2 - leg_margin * 3;

        translate([o, o, 0])
        screw_hole();

        translate([o, -o, 0])
        screw_hole();

        translate([-o, o, 0])
        screw_hole();

        translate([-o, -o, 0])
        screw_hole();
    }

    difference() {
        plate();

        translate([0, leg_width / 2, 0])
        screw_hole_group();


        translate([0, - leg_width / 2, 0])
        screw_hole_group();
    }
}

joiner();
